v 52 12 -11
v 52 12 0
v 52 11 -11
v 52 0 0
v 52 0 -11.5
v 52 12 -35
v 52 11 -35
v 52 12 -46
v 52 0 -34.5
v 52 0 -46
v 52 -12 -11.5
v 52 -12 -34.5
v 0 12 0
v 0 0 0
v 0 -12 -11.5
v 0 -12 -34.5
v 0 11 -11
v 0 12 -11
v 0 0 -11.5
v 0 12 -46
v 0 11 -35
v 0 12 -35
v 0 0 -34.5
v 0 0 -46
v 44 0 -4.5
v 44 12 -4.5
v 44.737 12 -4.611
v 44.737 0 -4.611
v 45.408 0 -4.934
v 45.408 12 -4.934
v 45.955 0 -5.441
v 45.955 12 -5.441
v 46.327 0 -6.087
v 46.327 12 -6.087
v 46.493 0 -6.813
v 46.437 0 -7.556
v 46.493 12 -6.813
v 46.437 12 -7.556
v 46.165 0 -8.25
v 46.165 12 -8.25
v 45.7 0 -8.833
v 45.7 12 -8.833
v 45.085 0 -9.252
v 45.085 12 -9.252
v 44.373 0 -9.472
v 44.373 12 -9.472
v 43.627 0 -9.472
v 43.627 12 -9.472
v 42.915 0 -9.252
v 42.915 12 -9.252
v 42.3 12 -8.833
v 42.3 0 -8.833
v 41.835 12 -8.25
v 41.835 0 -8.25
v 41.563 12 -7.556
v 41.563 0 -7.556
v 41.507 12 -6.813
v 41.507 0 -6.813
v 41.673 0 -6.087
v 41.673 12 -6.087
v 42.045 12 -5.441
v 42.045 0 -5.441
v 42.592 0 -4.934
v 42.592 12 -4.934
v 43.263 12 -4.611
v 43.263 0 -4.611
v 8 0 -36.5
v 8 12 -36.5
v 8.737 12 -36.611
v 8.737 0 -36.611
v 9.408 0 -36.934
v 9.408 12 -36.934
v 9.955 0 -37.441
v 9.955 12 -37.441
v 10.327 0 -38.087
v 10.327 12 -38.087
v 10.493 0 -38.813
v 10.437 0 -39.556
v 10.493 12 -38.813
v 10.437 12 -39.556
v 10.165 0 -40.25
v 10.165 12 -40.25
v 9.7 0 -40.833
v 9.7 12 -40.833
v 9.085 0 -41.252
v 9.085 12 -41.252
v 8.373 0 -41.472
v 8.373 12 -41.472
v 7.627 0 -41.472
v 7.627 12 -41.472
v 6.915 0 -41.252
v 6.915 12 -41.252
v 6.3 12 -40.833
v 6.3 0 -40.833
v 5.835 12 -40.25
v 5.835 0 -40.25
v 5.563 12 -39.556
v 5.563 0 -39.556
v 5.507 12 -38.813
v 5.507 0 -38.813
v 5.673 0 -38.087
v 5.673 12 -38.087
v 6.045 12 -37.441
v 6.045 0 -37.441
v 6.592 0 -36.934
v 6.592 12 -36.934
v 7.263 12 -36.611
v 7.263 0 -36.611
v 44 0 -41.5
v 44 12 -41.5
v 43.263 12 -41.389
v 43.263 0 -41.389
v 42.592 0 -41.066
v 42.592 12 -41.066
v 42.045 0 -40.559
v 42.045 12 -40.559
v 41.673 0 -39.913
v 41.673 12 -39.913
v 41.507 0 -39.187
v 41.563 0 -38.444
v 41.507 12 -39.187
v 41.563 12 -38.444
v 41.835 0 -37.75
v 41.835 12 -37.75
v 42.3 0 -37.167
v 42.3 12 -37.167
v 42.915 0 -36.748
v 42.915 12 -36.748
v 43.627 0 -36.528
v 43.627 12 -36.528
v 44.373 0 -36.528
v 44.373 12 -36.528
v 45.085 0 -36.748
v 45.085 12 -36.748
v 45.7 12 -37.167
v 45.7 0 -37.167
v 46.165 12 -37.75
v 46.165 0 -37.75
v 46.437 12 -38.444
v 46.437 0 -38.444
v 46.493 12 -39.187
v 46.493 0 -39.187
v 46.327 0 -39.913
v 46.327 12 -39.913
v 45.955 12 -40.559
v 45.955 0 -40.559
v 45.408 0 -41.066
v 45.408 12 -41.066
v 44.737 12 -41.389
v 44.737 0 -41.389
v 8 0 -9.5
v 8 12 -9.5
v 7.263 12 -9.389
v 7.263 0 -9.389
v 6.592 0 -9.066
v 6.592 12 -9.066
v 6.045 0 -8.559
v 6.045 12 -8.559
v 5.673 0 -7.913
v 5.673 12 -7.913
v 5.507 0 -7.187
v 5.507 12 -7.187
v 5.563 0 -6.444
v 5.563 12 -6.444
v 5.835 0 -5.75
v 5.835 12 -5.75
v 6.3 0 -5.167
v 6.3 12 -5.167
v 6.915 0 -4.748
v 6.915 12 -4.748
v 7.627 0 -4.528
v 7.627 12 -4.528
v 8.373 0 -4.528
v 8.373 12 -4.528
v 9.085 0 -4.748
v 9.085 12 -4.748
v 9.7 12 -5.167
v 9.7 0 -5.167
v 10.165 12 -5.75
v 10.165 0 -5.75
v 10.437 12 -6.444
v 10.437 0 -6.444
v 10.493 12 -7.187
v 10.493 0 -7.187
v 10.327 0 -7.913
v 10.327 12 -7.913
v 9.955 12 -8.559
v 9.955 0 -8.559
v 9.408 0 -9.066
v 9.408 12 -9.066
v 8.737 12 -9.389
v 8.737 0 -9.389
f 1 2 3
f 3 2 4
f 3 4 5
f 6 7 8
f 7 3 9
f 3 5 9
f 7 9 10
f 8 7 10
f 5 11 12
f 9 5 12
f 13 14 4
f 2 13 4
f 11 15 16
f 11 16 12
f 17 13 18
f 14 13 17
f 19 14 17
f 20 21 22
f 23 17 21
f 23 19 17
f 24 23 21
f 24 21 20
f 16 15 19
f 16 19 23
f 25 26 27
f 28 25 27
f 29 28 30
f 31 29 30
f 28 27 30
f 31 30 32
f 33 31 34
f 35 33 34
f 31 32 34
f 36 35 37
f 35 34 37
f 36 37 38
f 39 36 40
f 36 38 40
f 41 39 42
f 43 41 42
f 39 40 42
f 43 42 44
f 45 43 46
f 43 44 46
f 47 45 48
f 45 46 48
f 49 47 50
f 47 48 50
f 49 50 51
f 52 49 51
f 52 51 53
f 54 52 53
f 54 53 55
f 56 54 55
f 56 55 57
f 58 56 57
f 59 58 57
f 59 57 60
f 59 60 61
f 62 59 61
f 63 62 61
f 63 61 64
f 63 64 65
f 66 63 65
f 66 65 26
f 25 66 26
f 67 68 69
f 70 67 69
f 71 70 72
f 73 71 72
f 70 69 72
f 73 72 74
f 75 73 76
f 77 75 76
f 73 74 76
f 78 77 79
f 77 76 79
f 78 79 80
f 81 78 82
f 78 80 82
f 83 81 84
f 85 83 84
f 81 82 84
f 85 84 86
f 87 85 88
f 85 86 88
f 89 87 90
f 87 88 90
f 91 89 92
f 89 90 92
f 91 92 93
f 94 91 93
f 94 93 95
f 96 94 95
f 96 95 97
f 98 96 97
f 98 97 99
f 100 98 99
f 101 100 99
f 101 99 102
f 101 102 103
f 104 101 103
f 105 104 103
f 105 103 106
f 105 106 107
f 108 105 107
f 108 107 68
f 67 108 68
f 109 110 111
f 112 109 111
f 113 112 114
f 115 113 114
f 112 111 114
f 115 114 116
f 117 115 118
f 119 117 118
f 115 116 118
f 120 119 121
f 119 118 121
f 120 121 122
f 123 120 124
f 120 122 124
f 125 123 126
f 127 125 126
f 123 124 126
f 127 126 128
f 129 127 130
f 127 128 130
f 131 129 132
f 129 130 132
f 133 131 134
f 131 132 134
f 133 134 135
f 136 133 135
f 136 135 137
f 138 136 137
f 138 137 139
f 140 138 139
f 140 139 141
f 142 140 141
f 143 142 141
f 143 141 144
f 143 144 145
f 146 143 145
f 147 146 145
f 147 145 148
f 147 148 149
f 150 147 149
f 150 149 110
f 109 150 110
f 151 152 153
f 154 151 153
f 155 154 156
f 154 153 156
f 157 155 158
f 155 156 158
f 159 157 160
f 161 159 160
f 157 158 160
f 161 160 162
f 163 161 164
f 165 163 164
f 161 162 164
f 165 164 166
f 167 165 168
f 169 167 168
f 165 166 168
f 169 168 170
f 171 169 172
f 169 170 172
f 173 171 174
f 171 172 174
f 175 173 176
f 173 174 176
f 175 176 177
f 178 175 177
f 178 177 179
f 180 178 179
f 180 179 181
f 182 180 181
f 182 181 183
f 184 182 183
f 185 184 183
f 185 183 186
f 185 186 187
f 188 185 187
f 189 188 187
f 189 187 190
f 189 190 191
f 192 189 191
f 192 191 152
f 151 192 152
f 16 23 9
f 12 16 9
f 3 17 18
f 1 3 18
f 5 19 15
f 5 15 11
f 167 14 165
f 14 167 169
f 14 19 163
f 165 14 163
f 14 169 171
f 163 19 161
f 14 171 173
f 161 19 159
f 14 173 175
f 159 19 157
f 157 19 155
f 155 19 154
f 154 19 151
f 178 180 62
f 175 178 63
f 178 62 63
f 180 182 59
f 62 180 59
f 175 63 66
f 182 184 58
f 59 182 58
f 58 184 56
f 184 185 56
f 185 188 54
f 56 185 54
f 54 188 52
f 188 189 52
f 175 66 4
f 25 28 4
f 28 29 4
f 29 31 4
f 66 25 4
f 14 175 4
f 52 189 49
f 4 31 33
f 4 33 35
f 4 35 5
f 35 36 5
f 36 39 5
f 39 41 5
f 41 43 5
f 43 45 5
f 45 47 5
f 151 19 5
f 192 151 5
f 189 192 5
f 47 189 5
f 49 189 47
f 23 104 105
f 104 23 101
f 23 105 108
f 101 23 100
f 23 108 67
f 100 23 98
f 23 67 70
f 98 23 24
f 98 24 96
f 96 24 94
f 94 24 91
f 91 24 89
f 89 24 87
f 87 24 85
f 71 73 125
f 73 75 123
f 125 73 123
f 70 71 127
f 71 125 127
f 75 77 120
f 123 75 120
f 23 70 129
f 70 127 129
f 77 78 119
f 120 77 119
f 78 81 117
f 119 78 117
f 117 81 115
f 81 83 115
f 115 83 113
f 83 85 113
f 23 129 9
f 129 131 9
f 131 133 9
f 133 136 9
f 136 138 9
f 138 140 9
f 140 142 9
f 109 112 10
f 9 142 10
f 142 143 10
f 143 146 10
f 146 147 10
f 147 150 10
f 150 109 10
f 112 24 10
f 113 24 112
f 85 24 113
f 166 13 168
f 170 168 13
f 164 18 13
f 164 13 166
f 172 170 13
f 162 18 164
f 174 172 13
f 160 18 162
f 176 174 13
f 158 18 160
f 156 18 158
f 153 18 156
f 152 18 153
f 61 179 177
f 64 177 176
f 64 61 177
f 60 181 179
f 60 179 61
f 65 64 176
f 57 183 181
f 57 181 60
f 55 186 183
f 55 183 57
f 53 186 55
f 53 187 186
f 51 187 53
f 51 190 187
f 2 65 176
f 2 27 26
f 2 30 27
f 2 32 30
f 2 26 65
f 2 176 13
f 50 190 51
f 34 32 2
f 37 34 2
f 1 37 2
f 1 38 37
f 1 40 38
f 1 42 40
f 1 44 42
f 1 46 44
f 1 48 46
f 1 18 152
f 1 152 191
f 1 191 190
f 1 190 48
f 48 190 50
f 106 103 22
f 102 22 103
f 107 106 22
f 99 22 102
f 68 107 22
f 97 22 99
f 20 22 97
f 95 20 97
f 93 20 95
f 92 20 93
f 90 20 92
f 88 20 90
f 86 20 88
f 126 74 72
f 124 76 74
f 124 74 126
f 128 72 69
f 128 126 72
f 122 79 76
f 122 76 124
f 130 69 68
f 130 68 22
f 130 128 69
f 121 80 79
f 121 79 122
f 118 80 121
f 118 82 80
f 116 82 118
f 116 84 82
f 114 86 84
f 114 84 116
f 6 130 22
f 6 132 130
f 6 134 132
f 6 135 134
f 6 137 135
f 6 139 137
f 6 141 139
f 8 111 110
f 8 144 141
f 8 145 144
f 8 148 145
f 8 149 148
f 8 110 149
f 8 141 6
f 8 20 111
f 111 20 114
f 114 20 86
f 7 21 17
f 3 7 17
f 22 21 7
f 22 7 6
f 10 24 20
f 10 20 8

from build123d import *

# Parameters (mm, degrees)
SKETCH_1_W          = 52
SKETCH_1_H          = 46
EXTRUDE_1_DEPTH     = 12
SKETCH_2_W          = 52
SKETCH_2_H          = 23
EXTRUDE_2_DEPTH     = 12
SKETCH_3_R          = 2.5
CUT_EXTRUDE_1_DEPTH = 74.457470689
SKETCH_4_W          = 24
SKETCH_4_H          = 1
CUT_EXTRUDE_2_DEPTH = 71.455659815


with BuildPart() as part:
    # 草图1 → 凸台-拉伸1 (new body)
    with BuildSketch(Plane(origin=(0, 0, 0), x_dir=(1, 0, 0), z_dir=(0, 1, 0))):
        with Locations((26, 23)):
            Rectangle(SKETCH_1_W, SKETCH_1_H)
    extrude(amount=EXTRUDE_1_DEPTH)

    # 草图2 → 凸台-拉伸2 (add)
    with BuildSketch(Plane.XZ):
        with Locations((26, -23)):
            Rectangle(SKETCH_2_W, SKETCH_2_H)
    extrude(amount=EXTRUDE_2_DEPTH)

    # 草图3 → 切除-拉伸1 (cut, through all)
    with BuildSketch(Plane(origin=(0, 12, 0), x_dir=(1, 0, 0), z_dir=(0, 1, 0))):
        with Locations(Location((8, 39, 0), (0, 0, 270))):
            Circle(SKETCH_3_R)
        with Locations(Location((8, 7, 0), (0, 0, 90))):
            Circle(SKETCH_3_R)
        with Locations(Location((44, 7, 0), (0, 0, 270))):
            Circle(SKETCH_3_R)
        with Locations(Location((44, 39, 0), (0, 0, 90))):
            Circle(SKETCH_3_R)
    extrude(amount=-CUT_EXTRUDE_1_DEPTH, mode=Mode.SUBTRACT)

    # 草图4 → 切除-拉伸2 (cut, through all)
    with BuildSketch(Plane.ZY):
        with Locations((-23, 11.5)):
            Rectangle(SKETCH_4_W, SKETCH_4_H)
    extrude(amount=-CUT_EXTRUDE_2_DEPTH, mode=Mode.SUBTRACT)


solid = part.part
